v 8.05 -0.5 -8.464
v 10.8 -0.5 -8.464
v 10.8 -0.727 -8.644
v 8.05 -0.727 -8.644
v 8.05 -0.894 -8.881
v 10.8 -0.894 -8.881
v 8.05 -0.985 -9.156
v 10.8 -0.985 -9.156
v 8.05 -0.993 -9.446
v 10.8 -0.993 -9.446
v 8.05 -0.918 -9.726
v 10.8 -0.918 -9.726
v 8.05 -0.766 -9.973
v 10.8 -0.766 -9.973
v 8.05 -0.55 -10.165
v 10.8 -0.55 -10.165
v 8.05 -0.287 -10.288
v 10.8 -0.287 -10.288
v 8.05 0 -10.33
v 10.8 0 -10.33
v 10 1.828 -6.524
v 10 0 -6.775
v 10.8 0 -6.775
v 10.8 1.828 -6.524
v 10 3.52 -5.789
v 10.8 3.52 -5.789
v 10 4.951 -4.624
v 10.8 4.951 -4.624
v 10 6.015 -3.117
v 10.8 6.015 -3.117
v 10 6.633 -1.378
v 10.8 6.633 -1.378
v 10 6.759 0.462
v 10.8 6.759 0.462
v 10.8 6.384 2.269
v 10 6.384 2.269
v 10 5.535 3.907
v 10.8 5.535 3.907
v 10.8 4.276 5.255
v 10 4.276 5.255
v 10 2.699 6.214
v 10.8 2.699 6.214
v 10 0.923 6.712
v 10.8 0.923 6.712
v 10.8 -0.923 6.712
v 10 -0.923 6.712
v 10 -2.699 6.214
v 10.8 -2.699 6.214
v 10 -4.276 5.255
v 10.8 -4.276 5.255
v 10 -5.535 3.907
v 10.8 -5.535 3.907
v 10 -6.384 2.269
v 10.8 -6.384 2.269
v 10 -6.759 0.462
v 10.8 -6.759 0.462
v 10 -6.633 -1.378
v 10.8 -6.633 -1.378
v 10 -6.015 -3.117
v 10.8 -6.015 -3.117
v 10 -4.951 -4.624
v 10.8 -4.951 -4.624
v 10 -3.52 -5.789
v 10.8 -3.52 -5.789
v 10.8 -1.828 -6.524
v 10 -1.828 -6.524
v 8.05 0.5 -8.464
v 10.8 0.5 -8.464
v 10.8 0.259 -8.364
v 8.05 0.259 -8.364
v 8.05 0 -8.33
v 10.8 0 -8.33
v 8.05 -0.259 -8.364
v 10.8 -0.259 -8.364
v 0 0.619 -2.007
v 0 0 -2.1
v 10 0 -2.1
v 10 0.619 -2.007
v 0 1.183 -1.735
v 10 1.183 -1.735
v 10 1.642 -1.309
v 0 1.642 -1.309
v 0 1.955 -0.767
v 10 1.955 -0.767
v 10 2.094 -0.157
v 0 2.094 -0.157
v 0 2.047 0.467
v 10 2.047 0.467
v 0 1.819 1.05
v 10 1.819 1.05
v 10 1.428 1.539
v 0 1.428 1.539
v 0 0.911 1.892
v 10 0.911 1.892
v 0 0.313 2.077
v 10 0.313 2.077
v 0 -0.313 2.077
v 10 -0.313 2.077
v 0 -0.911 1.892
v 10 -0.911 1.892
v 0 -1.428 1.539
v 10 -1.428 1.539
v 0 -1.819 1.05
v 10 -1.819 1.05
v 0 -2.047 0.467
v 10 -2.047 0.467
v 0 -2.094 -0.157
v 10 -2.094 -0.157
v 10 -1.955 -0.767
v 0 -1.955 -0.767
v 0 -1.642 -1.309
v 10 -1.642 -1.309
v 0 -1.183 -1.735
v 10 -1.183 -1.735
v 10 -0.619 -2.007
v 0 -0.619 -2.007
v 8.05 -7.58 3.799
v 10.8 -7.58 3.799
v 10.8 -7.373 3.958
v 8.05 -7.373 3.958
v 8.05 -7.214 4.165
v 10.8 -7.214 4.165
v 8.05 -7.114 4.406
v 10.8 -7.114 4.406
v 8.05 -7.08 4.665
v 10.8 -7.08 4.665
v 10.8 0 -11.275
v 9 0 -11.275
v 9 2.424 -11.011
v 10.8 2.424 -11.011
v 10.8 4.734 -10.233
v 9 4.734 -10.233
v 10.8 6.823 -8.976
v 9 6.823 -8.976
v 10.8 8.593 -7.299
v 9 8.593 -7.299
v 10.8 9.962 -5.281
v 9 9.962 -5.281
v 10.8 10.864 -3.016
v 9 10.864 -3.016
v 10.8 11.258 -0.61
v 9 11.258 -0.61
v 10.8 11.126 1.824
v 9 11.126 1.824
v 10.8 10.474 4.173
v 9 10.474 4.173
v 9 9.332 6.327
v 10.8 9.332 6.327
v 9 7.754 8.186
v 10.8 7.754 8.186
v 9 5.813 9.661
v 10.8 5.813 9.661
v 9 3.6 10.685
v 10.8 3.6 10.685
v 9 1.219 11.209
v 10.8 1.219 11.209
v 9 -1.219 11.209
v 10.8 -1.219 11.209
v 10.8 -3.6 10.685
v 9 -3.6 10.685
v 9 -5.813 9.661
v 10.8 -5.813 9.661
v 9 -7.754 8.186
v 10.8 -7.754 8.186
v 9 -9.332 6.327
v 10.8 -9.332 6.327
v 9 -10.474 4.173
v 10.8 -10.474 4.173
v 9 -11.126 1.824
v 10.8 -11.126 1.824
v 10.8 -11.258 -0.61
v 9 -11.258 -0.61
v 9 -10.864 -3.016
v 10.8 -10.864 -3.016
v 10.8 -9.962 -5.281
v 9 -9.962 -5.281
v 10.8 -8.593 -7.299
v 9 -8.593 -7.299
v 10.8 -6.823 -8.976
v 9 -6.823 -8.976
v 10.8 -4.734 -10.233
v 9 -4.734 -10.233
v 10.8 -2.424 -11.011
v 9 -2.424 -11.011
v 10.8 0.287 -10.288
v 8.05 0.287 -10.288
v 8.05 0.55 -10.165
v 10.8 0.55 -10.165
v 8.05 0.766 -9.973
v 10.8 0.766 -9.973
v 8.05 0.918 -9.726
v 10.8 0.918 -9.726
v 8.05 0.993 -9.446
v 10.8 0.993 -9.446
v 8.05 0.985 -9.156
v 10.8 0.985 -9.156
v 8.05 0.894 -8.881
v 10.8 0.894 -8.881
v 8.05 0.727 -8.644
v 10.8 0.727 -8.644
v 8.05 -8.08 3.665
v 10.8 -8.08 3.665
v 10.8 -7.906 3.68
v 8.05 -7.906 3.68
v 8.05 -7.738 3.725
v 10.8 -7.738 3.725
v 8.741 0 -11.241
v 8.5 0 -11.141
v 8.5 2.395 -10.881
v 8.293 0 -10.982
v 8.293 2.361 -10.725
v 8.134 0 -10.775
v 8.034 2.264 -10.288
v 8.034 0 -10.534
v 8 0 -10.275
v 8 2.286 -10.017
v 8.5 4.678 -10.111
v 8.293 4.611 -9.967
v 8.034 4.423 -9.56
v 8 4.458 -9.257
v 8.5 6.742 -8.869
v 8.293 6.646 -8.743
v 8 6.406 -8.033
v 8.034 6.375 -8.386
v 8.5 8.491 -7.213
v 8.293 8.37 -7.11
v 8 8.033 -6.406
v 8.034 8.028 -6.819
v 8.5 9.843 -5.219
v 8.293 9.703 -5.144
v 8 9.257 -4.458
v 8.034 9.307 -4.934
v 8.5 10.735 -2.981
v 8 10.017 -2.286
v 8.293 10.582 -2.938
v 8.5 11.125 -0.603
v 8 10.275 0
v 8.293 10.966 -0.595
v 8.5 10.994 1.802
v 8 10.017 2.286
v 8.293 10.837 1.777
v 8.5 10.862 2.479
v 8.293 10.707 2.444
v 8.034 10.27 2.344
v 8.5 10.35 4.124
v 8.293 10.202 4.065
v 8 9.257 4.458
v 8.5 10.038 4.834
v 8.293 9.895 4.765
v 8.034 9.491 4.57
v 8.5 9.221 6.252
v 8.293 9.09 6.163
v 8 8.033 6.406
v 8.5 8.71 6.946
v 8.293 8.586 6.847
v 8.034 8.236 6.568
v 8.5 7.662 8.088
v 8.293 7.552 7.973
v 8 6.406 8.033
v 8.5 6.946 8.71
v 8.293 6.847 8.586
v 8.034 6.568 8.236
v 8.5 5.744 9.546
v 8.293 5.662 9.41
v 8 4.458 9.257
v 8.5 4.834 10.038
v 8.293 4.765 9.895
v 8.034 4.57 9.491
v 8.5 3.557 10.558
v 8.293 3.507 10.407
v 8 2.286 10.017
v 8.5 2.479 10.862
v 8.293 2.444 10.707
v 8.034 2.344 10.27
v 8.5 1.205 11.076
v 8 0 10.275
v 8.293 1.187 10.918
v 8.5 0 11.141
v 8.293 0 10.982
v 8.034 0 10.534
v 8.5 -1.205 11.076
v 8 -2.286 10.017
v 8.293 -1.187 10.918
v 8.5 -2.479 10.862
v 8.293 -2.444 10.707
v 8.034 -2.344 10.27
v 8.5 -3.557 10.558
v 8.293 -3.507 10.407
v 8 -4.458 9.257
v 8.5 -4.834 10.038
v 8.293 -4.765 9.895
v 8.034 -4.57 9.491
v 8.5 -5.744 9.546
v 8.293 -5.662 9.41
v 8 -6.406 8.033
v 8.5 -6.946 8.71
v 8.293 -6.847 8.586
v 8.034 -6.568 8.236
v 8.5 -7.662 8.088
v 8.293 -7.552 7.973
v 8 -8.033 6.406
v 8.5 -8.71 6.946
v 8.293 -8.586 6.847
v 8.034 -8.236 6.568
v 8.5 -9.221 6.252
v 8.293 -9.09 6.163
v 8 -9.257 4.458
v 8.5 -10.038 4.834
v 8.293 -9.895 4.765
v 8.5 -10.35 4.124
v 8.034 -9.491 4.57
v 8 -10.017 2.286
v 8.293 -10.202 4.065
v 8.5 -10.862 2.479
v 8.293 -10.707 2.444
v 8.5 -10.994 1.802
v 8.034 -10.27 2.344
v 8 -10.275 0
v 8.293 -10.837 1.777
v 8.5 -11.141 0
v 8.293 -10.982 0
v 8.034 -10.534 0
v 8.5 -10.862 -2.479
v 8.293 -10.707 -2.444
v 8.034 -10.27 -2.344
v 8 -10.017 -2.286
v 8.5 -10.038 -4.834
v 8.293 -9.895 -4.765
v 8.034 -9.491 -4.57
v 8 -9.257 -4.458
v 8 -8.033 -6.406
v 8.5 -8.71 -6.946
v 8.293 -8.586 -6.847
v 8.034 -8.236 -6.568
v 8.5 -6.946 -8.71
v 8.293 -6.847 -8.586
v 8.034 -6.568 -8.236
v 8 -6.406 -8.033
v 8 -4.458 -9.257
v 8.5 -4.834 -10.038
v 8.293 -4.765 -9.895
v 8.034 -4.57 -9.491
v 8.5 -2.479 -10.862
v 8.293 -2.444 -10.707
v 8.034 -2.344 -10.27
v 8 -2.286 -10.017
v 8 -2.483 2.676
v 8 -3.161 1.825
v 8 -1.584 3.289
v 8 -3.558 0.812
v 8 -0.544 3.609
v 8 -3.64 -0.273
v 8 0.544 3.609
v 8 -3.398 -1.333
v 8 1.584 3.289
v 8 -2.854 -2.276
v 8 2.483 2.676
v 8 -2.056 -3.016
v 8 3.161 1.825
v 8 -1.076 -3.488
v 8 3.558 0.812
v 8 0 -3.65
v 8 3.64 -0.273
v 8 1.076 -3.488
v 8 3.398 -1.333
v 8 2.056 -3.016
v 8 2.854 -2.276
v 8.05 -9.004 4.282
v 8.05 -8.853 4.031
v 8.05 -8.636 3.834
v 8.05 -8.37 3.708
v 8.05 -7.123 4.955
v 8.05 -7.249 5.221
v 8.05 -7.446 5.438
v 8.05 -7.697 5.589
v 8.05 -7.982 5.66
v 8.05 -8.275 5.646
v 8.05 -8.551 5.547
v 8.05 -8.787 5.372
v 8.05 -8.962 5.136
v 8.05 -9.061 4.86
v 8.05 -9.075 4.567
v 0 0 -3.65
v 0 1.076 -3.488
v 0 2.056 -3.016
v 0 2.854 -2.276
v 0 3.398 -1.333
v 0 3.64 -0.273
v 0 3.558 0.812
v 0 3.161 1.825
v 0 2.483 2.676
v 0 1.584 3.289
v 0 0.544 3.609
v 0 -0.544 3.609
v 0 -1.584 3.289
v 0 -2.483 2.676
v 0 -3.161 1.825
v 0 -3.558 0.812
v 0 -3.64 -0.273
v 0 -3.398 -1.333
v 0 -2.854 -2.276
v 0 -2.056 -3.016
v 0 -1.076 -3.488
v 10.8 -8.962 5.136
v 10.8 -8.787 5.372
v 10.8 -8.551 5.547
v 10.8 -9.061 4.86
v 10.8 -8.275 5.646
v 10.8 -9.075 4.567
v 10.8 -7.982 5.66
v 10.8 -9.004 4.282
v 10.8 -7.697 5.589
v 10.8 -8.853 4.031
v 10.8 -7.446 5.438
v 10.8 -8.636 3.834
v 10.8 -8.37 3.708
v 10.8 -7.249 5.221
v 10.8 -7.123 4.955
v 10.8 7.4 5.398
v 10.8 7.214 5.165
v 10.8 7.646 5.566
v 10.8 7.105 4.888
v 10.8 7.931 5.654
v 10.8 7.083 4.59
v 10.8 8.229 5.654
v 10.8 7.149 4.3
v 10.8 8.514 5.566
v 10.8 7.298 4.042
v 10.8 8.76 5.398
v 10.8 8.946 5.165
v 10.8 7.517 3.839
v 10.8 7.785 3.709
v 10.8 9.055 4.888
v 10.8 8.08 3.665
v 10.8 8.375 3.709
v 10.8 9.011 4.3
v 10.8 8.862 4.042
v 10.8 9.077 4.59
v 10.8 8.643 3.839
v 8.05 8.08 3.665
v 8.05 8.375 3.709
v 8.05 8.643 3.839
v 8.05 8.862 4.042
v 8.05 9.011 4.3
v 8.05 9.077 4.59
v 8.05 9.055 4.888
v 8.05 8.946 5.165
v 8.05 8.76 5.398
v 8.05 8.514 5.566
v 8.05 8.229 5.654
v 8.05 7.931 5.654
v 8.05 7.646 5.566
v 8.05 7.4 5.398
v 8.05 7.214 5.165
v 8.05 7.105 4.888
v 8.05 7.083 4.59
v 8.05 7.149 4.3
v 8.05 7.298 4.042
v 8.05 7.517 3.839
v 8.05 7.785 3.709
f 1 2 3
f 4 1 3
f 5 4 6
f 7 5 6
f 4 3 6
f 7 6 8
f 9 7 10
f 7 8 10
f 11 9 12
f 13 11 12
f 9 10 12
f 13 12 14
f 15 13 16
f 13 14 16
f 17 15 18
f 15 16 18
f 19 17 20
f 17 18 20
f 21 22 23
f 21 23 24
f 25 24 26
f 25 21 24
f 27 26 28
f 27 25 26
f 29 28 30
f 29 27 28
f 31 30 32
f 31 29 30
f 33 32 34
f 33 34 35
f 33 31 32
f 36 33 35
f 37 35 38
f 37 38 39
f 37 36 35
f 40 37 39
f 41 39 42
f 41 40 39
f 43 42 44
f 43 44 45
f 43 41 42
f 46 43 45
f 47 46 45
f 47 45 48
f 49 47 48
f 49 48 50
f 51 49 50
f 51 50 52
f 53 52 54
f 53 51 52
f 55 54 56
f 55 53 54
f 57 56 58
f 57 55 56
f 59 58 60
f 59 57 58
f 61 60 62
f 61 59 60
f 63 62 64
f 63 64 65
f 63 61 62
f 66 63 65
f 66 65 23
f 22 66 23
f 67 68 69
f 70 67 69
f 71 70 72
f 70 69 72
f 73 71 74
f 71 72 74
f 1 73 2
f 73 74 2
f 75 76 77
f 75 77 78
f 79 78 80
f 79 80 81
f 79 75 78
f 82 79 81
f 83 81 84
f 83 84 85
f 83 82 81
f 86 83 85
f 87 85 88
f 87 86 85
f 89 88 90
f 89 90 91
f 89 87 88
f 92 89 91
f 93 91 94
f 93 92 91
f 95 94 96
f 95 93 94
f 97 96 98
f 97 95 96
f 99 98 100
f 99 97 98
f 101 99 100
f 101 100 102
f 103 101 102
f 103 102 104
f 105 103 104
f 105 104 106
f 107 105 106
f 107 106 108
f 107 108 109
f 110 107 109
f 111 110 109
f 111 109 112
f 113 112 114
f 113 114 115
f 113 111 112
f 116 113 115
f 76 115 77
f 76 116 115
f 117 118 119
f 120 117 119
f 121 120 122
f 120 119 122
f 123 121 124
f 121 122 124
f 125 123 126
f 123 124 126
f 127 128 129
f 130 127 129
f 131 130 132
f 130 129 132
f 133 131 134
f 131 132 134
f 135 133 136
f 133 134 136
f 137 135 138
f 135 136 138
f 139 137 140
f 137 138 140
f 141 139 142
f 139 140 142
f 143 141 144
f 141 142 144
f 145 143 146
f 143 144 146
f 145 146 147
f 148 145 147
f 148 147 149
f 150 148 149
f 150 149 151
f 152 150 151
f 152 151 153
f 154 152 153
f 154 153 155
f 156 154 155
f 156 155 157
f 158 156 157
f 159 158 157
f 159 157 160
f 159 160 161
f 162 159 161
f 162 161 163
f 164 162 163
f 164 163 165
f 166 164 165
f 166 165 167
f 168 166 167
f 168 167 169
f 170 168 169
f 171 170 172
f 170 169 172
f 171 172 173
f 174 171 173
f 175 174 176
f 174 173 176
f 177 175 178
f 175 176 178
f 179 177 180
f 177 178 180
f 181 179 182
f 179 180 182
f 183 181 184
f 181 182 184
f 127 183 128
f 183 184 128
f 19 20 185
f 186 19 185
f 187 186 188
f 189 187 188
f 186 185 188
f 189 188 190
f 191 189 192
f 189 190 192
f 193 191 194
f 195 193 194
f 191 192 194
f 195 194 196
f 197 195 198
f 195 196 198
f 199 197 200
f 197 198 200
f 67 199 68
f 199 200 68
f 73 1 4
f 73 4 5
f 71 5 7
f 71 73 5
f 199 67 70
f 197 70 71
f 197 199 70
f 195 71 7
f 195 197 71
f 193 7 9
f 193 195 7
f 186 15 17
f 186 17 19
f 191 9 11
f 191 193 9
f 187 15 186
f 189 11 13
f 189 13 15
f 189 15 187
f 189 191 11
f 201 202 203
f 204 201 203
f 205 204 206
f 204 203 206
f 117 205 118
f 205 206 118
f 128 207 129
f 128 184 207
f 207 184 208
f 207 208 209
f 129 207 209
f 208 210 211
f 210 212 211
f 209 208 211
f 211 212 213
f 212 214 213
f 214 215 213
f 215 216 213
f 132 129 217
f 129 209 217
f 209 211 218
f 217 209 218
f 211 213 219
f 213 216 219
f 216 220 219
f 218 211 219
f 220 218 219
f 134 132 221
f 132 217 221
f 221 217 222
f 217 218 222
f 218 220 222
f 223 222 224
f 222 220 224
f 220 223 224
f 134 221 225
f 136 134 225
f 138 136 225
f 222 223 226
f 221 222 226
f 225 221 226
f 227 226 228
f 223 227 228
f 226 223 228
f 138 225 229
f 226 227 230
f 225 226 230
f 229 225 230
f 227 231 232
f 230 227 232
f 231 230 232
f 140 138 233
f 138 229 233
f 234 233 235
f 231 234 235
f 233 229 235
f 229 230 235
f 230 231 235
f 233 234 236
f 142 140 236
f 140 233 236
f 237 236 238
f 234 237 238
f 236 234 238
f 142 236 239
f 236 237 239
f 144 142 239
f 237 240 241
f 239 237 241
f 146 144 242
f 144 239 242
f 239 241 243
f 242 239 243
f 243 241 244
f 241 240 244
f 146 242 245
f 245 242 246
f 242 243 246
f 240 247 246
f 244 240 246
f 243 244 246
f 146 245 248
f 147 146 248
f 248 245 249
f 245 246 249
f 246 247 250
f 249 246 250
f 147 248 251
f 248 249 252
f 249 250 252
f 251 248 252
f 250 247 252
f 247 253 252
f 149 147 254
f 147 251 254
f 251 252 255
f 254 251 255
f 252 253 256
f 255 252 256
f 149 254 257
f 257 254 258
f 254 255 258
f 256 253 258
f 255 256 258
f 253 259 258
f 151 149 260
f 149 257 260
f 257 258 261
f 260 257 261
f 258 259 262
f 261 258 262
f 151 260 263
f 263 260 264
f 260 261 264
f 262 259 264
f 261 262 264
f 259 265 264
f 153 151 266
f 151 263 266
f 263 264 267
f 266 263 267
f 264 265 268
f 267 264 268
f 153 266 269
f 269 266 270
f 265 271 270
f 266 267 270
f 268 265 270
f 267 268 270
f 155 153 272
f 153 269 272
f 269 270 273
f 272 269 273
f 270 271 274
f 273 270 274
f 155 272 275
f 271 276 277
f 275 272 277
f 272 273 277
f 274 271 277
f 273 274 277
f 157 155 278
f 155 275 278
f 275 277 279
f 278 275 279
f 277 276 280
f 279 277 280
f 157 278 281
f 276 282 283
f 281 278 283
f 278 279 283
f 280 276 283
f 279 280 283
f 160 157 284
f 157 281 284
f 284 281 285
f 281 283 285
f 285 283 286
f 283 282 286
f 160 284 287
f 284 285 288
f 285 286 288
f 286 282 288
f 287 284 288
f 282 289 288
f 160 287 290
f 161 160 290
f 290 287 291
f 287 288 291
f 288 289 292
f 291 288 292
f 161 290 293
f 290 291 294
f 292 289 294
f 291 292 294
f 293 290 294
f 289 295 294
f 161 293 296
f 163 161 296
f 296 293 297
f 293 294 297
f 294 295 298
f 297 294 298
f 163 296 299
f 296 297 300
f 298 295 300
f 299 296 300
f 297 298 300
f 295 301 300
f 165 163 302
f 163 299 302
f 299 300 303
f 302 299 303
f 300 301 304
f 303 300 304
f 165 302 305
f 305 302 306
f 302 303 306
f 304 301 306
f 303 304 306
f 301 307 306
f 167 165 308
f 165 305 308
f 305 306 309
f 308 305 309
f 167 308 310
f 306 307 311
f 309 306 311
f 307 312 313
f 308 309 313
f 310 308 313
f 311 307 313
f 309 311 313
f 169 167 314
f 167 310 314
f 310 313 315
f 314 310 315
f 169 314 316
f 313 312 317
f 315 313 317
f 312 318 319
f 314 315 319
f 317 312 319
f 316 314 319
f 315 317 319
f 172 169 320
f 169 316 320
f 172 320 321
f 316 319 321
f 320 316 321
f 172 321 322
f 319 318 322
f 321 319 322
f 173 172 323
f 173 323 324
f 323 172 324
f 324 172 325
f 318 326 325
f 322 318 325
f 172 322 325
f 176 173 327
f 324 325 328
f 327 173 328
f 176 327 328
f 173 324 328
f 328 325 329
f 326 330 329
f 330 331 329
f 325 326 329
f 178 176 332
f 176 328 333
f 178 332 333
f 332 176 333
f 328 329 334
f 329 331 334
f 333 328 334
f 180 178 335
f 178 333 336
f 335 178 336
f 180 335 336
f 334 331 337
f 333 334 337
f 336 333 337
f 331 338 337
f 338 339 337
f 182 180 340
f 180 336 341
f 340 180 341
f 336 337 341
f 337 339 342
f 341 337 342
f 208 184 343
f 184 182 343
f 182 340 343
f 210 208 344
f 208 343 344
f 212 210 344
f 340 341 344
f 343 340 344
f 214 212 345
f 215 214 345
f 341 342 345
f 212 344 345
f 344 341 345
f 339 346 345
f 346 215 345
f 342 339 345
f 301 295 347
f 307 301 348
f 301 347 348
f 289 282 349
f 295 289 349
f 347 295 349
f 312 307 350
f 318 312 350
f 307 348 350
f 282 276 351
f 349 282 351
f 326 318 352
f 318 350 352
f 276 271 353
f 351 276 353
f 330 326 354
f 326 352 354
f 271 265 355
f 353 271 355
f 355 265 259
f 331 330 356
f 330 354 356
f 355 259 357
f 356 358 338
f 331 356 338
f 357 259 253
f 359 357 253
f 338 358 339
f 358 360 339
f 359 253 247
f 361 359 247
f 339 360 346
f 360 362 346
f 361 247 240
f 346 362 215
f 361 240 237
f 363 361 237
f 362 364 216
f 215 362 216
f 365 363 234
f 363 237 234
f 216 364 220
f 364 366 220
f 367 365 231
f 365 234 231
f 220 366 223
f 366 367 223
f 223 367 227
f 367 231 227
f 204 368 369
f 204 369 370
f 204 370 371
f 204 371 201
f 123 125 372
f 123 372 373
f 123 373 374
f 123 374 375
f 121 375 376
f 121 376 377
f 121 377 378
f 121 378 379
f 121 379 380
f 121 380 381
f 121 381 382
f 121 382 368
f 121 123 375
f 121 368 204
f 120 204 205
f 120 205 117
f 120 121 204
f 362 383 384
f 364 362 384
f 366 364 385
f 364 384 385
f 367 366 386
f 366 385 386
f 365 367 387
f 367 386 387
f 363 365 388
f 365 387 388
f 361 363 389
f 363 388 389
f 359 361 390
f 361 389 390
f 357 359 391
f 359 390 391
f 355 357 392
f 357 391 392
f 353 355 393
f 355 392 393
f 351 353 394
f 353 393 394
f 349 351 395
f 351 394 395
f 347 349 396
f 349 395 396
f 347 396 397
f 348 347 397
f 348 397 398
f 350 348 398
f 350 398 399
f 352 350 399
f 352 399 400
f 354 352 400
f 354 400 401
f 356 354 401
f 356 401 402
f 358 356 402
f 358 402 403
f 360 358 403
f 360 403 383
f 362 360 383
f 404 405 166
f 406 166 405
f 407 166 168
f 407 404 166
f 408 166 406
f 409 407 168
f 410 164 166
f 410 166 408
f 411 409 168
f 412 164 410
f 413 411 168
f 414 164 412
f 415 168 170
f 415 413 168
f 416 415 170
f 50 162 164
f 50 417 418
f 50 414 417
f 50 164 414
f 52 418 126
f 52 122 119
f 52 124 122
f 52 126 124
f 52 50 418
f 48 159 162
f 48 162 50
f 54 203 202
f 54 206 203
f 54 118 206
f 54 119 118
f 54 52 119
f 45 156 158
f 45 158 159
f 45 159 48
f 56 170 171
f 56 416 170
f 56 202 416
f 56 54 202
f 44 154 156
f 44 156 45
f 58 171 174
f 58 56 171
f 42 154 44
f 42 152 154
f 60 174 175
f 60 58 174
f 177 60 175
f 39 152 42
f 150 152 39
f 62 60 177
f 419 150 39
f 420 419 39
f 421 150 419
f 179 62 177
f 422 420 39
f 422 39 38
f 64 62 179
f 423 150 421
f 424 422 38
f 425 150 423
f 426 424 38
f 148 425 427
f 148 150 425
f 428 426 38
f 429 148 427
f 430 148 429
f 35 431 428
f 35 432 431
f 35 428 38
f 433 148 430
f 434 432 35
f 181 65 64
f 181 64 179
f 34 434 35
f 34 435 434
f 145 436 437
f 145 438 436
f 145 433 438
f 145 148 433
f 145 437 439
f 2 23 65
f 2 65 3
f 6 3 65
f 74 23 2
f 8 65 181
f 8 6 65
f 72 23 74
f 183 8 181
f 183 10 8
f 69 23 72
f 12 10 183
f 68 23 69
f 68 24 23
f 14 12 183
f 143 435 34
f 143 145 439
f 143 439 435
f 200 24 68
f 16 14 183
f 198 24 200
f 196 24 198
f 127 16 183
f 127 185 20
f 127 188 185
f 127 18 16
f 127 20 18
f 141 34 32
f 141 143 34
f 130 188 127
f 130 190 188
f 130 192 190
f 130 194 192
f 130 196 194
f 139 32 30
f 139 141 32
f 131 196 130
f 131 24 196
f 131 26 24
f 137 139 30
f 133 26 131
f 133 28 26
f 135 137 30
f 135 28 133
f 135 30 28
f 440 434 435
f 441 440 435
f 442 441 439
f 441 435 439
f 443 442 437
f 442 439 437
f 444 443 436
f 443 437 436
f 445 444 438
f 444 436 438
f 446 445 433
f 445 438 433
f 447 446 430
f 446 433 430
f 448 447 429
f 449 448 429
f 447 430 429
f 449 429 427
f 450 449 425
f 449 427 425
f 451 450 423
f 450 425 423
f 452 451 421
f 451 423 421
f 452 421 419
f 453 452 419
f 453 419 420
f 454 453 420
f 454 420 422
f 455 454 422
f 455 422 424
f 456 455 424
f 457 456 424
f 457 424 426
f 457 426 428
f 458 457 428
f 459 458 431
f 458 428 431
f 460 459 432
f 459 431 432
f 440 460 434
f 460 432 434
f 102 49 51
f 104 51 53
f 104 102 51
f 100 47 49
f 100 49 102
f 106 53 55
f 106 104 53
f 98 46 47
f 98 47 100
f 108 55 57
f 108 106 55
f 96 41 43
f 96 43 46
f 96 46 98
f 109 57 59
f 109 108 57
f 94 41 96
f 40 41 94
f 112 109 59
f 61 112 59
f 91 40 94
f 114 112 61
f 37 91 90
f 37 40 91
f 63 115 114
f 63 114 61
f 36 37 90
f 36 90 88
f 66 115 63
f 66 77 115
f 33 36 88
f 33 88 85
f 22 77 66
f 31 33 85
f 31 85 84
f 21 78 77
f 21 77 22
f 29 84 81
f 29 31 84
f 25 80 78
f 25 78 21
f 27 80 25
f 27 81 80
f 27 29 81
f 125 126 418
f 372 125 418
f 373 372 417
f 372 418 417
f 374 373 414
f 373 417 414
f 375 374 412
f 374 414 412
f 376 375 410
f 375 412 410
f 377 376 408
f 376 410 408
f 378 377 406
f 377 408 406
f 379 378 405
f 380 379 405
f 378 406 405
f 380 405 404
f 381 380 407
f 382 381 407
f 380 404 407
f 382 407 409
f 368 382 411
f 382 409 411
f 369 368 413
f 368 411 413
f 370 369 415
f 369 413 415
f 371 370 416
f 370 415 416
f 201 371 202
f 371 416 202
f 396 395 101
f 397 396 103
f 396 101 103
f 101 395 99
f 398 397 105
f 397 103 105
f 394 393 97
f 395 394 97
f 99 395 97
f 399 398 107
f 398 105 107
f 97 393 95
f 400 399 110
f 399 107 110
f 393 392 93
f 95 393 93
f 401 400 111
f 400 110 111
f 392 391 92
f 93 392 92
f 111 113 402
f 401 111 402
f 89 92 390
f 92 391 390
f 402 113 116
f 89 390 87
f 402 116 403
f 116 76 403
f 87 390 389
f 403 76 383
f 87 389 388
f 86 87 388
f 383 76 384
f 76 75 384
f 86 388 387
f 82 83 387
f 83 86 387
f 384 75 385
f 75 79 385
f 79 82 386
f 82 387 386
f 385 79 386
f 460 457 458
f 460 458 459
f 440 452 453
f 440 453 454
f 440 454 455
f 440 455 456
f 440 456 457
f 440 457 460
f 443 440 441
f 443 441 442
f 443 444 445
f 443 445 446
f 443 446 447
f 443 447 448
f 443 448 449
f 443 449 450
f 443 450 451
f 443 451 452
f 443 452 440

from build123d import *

# Parameters (mm, degrees)
SKETCH3_R           = 3.65
SKETCH3_R_2         = 2.1
BOSS_EXTRUDE3_DEPTH = 10
BOSS_EXTRUDE5_START = -2
SKETCH10_R          = 11.275
SKETCH10_R_2        = 2.1
BOSS_EXTRUDE5_DEPTH = 2
SKETCH11_R          = 11.275
SKETCH11_R_2        = 6.775
BOSS_EXTRUDE6_DEPTH = 0.8
SKETCH12_R          = 1
CUT_EXTRUDE2_DEPTH  = 2.75
FILLET3_R           = 1


with BuildPart() as part:
    # Sketch3 → Boss-Extrude3 (new body)
    with BuildSketch(Plane(origin=(0, 0, 0), x_dir=(0, 0, -1), z_dir=(1, 0, 0))):
        Circle(SKETCH3_R)
        Circle(SKETCH3_R_2, mode=Mode.SUBTRACT)
    extrude(amount=BOSS_EXTRUDE3_DEPTH)

    # Sketch10 → Boss-Extrude5 (add)
    with BuildSketch(Plane(origin=(10, 0, 0), x_dir=(0, 0, -1), z_dir=(1, 0, 0)).offset(BOSS_EXTRUDE5_START)):
        Circle(SKETCH10_R)
        Circle(SKETCH10_R_2, mode=Mode.SUBTRACT)
    extrude(amount=BOSS_EXTRUDE5_DEPTH)

    # Sketch11 → Boss-Extrude6 (add)
    with BuildSketch(Plane(origin=(10, 0, 0), x_dir=(0, 0, -1), z_dir=(1, 0, 0))):
        Circle(SKETCH11_R)
        Circle(SKETCH11_R_2, mode=Mode.SUBTRACT)
    extrude(amount=BOSS_EXTRUDE6_DEPTH)

    # Sketch12 → Cut-Extrude2 (cut)
    with BuildSketch(Plane(origin=(10.8, 0, 0), x_dir=(0, 0, -1), z_dir=(1, 0, 0))):
        with Locations((9.33, 0)):
            Circle(SKETCH12_R)
        with Locations((-4.665, 8.080017017)):
            Circle(SKETCH12_R)
        with Locations((-4.665, -8.080017017)):
            Circle(SKETCH12_R)
    extrude(amount=-CUT_EXTRUDE2_DEPTH, mode=Mode.SUBTRACT)

    # Fillet3
    fillet3_edges = [part.edges().sort_by_distance(p)[0] for p in [
        (8, 0, 11.275),
    ]]
    fillet(fillet3_edges, radius=FILLET3_R)


solid = part.part
